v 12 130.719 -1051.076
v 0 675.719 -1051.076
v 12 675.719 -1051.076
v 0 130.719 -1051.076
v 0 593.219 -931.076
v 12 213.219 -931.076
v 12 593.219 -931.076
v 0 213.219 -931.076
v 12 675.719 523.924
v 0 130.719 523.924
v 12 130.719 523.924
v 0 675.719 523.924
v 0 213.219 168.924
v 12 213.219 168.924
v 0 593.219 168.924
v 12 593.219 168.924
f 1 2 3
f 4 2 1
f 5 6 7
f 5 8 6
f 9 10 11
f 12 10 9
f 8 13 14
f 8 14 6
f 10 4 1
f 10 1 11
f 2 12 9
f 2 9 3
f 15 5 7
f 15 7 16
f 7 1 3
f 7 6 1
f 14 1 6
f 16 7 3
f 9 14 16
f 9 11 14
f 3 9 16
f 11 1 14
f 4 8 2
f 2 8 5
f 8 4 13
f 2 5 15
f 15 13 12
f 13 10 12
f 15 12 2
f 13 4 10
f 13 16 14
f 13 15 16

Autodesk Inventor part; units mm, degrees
ref_plane "YZ Plane" through (0, 0, 0) normal (1, 0, 0) x (0, 1, 0)
ref_plane "XZ Plane" through (0, 0, 0) normal (0, 1, 0) x (-1, 0, 0)
ref_plane "XY Plane" through (0, 0, 0) normal (0, 0, 1) x (1, 0, 0)
sketch "Sketch1" plane through (0, 0, 0) normal (1, 0, 0) x (0, 1, 0)
  line L0 (130.7193, 523.9242) -> (675.7193, 523.9242)
  line L1 (675.7193, 523.9242) -> (675.7193, -1051.0758)
  line L2 (675.7193, -1051.0758) -> (130.7193, -1051.0758)
  line L3 (130.7193, -1051.0758) -> (130.7193, 523.9242)
  line L4 (213.2193, -931.0758) -> (593.2193, -931.0758)
  line L5 (593.2193, -931.0758) -> (593.2193, 168.9242)
  line L6 (593.2193, 168.9242) -> (213.2193, 168.9242)
  line L7 (213.2193, 168.9242) -> (213.2193, -931.0758)
  point P0 (0, 0)
  dimension "b" = 545
  dimension "d1" = 1575
  dimension "d4" = 380
  dimension "d5" = 82.5
  dimension "d6" = 1100
  dimension "d8" = 120
extrude "Extrusion1" add sketch "Sketch1" along normal blind 12 contours L0 L1 L2 L3 | L7 L6 L5 L4
extrude "Extrusion2" cut sketch "Sketch1" along normal up to next contours L7 L6 L5 L4
equation "\"d5\" = -0.5 * d4 + 0.5 * b"
properties part number "CUT PART G-01" material "Wood (Birch)"
